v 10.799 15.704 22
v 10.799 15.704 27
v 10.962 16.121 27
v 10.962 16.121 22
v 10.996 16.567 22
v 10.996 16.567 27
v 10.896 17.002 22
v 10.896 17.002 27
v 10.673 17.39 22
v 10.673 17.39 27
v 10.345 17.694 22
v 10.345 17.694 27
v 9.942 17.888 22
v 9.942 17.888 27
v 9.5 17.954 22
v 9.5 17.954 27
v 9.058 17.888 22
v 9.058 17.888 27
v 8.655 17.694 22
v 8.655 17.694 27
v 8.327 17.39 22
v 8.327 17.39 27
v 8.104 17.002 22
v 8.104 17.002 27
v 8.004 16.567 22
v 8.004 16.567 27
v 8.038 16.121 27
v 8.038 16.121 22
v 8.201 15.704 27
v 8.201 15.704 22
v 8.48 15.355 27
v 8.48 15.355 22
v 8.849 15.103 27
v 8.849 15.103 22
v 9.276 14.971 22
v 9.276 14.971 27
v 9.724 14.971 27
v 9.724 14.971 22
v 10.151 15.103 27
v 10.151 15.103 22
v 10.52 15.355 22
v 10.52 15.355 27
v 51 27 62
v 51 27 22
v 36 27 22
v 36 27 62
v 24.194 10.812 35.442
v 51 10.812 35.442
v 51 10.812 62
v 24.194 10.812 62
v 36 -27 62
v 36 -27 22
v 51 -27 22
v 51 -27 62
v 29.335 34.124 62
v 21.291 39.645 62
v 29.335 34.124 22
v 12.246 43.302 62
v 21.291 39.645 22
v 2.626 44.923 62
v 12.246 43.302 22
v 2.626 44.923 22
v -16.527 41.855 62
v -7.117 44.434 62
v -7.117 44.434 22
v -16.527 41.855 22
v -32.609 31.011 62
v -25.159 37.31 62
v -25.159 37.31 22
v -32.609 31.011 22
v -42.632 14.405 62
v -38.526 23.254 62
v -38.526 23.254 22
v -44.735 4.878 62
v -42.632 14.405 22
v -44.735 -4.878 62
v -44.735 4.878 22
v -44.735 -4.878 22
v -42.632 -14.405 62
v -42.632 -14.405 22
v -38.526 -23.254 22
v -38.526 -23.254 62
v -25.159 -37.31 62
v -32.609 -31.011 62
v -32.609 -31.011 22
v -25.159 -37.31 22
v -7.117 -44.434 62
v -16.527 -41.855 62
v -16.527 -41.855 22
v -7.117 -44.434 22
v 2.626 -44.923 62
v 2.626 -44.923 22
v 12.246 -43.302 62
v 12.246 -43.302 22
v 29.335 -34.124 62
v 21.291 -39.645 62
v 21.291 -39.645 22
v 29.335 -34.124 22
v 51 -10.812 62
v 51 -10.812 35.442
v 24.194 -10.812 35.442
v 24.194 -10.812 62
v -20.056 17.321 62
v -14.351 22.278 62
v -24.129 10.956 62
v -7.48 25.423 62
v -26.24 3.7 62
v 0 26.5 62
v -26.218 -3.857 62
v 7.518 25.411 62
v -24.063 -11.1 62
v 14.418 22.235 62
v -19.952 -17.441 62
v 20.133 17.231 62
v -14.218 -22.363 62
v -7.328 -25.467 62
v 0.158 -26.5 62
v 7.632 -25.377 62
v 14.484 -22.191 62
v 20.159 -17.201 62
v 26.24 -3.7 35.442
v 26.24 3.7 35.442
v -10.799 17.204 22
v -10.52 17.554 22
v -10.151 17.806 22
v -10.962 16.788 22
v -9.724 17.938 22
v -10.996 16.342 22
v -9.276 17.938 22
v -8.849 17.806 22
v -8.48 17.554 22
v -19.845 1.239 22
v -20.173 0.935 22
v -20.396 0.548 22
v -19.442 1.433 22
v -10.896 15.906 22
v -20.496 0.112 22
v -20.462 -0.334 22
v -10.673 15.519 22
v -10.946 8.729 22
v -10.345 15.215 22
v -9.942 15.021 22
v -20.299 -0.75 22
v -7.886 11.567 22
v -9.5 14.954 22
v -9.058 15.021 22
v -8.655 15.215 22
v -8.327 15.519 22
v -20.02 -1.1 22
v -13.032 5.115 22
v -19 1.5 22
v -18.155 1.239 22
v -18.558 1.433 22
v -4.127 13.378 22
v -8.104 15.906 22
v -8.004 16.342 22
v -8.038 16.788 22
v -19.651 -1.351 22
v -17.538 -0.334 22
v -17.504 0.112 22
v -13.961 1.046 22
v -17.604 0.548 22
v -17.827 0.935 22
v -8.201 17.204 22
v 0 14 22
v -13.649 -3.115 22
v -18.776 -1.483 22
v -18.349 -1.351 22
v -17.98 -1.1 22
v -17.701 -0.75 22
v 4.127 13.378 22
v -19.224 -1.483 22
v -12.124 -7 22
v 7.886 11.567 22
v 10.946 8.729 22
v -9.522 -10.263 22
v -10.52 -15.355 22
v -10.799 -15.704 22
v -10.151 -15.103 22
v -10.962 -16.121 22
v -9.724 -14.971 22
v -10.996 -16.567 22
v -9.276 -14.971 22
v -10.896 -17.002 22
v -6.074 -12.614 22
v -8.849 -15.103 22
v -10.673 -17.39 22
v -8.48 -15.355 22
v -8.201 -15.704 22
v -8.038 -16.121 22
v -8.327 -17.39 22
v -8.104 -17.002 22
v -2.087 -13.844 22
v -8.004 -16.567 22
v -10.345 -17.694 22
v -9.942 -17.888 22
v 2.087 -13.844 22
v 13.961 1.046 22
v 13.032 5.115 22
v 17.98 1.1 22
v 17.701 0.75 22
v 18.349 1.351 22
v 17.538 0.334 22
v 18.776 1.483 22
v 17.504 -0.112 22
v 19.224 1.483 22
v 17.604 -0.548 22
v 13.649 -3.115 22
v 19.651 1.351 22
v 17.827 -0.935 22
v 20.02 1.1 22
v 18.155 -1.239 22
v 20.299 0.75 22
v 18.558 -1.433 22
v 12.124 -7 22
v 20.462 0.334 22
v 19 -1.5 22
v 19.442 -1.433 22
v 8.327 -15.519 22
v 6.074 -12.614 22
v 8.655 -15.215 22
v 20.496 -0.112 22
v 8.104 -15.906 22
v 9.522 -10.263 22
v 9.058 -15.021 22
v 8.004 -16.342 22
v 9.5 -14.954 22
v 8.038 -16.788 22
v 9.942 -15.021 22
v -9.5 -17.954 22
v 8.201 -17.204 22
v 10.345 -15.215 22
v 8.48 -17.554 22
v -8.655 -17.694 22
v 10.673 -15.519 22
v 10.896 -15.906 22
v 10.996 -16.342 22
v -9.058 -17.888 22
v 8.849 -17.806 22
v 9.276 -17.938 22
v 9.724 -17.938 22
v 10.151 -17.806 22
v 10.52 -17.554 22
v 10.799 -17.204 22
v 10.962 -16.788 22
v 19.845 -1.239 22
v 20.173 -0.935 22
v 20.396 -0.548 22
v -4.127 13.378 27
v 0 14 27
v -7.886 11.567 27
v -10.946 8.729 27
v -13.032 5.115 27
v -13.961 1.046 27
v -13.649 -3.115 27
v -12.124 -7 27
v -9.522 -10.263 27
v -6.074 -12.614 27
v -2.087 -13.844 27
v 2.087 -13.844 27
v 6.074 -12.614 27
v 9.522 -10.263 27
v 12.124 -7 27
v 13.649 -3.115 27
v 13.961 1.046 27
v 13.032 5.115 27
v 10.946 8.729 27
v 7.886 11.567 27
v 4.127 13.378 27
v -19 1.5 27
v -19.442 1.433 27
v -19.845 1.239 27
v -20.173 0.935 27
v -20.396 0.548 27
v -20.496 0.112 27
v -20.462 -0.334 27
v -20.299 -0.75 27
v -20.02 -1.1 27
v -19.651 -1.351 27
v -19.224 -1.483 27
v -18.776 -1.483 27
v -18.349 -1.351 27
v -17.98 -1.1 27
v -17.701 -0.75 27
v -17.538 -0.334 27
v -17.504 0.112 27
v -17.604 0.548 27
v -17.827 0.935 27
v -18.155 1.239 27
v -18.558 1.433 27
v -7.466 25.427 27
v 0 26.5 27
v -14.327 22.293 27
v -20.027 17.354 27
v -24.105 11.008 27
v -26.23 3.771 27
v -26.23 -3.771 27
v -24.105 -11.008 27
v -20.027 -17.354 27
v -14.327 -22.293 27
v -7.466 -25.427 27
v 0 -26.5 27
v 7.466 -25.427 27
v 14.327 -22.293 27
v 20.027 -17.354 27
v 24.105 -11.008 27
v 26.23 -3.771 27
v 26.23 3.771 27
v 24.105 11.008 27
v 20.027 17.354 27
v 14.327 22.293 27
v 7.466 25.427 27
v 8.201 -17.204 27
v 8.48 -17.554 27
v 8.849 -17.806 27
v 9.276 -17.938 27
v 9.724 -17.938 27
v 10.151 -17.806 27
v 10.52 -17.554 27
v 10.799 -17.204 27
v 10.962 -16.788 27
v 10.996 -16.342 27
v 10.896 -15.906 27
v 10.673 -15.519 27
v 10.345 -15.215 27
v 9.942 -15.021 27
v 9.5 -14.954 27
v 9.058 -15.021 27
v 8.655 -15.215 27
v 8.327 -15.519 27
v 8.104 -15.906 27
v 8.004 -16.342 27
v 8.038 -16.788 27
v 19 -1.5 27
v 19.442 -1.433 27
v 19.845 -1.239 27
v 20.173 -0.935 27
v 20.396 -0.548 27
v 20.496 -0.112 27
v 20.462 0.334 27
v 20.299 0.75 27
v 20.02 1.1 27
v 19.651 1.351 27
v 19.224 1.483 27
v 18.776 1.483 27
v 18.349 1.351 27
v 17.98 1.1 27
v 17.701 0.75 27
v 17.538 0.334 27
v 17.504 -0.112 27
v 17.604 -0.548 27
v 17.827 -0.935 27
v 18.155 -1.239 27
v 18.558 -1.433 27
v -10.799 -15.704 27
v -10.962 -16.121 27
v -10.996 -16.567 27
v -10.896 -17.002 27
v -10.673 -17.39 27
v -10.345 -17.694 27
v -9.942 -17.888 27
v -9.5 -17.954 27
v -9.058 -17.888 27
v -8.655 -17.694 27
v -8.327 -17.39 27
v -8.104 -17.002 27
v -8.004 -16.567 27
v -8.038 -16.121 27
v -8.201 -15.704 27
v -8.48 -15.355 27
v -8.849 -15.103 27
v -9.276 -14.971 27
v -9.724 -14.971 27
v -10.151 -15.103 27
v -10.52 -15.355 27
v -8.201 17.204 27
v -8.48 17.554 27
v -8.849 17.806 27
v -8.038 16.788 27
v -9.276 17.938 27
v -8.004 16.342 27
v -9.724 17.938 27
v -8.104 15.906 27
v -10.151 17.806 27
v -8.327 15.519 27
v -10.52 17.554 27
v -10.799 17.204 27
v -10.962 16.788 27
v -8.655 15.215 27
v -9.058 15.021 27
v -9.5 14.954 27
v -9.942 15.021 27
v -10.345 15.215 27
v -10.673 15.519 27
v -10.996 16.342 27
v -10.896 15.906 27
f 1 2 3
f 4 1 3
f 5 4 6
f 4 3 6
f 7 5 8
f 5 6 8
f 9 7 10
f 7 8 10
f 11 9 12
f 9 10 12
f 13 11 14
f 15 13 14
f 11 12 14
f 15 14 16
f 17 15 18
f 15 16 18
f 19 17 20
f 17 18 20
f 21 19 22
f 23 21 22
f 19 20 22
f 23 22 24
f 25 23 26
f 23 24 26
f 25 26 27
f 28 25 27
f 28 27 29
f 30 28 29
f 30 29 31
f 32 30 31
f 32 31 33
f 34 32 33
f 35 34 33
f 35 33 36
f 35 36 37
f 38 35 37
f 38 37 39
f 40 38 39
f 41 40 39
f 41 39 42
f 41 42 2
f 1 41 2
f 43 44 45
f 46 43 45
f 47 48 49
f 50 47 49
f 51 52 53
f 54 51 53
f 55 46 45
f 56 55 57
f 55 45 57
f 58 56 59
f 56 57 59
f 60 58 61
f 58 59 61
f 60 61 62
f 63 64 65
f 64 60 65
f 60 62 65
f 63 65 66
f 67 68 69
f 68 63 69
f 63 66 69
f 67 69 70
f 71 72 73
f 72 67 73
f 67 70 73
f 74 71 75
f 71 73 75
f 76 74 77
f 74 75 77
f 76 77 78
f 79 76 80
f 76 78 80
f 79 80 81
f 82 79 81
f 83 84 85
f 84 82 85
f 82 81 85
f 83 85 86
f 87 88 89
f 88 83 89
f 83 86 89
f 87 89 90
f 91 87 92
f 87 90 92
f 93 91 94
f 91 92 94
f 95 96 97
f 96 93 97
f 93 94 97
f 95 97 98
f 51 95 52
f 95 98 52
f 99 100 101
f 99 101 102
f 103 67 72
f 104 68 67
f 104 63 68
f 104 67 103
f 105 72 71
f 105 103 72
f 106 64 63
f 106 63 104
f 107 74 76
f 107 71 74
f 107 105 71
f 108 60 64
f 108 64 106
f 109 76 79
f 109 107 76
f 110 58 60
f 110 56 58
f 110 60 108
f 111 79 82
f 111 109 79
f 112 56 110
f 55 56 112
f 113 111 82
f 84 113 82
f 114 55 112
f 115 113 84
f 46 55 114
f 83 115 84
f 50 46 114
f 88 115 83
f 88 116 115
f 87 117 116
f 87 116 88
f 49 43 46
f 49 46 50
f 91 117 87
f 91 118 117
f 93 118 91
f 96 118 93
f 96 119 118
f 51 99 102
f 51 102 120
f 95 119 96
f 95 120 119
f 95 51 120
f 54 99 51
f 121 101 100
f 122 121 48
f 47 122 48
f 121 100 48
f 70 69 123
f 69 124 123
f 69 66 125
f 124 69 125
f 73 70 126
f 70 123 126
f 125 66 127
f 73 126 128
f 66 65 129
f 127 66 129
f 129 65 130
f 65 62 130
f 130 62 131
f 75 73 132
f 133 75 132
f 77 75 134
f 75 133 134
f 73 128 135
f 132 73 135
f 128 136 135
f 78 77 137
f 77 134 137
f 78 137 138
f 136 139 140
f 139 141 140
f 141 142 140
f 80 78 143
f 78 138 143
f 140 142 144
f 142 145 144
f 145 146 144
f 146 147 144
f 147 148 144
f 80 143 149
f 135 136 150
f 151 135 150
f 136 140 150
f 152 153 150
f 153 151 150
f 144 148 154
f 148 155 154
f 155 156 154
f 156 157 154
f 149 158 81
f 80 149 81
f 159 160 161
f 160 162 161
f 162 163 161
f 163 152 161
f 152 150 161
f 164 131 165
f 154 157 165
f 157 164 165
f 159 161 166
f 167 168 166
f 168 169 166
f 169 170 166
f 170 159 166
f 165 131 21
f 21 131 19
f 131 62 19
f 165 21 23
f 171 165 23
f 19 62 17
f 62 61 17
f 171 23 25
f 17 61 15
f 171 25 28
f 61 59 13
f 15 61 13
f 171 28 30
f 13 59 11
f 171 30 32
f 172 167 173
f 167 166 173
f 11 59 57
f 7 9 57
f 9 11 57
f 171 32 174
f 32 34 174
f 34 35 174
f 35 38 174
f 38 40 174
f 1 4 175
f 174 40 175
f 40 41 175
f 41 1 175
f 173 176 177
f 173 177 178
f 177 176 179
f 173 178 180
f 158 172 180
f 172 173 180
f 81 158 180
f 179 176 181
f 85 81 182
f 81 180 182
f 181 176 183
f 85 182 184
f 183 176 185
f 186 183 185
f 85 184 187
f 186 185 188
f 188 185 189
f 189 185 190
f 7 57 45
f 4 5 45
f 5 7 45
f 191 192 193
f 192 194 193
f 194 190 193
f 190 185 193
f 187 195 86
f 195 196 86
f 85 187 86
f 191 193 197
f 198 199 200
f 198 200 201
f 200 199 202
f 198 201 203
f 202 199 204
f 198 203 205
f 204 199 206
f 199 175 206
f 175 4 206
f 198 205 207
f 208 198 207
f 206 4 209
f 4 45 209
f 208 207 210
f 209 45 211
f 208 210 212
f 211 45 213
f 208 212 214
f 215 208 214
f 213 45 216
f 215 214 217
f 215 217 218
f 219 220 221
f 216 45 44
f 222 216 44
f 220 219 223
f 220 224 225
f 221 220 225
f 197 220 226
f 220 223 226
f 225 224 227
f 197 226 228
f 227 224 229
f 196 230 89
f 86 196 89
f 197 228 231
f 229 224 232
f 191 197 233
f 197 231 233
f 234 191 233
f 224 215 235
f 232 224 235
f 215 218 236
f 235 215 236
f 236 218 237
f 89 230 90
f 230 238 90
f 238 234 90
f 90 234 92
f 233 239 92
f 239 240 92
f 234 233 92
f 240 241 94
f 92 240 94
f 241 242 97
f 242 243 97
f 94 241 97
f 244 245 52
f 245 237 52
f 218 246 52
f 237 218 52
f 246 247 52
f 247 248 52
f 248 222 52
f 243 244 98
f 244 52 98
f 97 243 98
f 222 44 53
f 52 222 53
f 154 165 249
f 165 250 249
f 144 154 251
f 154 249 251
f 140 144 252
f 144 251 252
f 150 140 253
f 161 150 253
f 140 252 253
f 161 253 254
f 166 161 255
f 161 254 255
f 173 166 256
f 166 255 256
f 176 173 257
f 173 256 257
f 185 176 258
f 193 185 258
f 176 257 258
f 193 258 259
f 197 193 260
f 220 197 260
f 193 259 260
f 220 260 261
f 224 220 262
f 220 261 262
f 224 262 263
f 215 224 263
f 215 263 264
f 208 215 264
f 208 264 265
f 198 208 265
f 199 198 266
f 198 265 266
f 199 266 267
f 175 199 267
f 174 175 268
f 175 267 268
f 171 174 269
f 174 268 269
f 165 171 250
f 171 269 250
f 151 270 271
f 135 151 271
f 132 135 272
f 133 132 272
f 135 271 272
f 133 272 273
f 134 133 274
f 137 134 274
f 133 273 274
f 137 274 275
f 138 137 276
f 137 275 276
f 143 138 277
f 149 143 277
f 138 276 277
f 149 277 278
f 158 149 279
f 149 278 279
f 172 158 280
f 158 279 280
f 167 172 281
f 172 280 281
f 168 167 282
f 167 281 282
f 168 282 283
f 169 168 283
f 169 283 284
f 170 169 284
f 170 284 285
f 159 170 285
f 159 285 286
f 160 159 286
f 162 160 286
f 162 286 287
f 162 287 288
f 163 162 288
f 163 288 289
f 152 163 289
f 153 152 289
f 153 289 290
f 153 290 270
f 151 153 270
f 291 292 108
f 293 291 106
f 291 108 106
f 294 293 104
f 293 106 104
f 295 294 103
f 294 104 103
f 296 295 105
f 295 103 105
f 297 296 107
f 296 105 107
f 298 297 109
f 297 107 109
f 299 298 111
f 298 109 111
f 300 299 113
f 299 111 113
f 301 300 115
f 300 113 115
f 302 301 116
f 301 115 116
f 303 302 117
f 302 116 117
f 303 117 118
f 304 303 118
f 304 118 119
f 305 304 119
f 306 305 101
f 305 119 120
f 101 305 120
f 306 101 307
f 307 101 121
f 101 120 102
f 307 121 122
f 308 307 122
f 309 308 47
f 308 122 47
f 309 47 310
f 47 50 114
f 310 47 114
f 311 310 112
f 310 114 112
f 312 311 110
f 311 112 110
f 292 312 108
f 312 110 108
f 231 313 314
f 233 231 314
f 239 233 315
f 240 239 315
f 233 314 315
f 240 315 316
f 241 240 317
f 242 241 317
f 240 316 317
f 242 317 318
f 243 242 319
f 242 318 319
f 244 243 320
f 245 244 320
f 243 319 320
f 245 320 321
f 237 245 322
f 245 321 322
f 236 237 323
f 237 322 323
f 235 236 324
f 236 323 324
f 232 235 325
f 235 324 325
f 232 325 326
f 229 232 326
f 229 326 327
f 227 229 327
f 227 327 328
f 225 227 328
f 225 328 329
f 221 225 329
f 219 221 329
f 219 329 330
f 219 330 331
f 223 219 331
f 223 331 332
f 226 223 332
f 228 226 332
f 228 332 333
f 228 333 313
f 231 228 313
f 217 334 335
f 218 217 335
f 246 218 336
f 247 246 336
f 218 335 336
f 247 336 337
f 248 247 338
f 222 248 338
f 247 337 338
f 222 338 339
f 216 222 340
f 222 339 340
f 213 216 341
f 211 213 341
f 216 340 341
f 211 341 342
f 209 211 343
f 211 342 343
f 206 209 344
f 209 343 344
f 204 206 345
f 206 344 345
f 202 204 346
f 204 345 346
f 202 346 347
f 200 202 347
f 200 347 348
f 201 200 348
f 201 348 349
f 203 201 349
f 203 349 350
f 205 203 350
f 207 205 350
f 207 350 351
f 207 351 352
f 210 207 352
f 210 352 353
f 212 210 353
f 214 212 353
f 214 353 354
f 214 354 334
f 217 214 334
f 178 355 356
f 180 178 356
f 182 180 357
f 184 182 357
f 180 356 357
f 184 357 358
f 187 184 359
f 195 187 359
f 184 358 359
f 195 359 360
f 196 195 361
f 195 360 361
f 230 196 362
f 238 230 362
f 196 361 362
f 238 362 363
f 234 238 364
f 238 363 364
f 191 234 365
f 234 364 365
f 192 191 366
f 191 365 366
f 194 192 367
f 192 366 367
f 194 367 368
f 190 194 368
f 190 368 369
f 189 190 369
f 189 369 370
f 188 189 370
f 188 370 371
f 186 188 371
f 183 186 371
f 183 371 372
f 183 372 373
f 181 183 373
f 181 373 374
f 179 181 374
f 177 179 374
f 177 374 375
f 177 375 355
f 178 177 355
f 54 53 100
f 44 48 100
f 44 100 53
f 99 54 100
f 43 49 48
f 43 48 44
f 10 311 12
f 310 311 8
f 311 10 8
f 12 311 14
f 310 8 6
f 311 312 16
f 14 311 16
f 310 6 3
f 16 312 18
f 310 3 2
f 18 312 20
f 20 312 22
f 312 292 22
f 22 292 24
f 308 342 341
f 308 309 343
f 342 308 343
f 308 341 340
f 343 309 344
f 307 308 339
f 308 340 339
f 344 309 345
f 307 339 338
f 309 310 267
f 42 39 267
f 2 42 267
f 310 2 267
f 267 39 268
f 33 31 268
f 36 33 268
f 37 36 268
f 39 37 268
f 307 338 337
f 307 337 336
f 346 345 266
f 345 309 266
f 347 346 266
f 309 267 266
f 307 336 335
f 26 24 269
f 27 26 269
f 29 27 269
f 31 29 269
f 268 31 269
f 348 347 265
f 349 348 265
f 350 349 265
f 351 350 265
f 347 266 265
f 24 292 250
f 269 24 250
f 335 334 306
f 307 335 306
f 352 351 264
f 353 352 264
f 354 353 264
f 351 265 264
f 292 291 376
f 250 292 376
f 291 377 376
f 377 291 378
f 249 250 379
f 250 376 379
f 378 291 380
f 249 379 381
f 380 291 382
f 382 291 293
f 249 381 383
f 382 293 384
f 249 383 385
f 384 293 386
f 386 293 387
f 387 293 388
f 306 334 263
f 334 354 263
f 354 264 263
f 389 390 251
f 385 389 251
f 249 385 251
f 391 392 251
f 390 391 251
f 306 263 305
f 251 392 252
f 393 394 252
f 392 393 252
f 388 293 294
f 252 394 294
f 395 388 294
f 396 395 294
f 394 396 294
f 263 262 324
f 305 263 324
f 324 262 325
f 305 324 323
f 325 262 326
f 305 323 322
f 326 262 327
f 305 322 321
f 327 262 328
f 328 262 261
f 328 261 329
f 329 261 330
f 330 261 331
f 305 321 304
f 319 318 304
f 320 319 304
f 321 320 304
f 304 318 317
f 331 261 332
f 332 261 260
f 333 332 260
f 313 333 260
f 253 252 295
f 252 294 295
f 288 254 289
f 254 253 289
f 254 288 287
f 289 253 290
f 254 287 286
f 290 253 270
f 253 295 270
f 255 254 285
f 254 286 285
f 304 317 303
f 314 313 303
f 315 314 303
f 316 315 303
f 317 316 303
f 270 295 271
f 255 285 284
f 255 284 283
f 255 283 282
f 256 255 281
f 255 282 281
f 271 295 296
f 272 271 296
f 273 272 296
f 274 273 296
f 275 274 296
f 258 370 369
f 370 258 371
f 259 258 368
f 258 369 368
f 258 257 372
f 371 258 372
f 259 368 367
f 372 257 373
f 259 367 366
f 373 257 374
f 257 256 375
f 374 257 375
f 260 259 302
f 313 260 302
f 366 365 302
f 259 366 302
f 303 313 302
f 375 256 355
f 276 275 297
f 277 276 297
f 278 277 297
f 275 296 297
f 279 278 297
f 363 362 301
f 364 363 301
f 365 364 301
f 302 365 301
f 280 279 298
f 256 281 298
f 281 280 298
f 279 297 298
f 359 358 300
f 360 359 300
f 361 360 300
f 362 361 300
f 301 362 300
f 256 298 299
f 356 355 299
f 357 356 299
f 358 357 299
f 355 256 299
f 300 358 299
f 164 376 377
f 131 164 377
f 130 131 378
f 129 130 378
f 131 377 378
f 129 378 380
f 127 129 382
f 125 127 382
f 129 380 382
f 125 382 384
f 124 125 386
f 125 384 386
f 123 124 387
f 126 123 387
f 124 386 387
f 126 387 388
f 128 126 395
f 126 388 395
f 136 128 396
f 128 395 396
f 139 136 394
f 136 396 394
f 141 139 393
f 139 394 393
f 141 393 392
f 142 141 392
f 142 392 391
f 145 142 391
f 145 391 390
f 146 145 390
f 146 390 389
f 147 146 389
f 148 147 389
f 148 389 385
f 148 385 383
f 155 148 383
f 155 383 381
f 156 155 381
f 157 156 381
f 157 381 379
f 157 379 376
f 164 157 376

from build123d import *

# Parameters (mm, degrees)
SKETCH014_R             = 1.5
POCKET_DEPTH            = 271.834281
POLARPATTERN_COUNT      = 6
PAD_DEPTH               = 40
SKETCH016_W             = 21.623292
SKETCH016_H             = 27.433631
POCKET001_DEPTH         = 35
BODY003_PLACEMENT_ANGLE = 90


with BuildPart() as part:
    # Sketch → Revolution (revolve)
    with BuildSketch(Plane.XZ):
        Polygon((14, 0), (14, 5), (26.5, 5), (26.5, 40), (45, 40), (45, 0), align=None)
    revolve(axis=Axis((0, 0, 0), (0, 0, 1)))

    # Sketch014 → Pocket (cut, through all)
    with BuildSketch(Plane.XY.offset(5)):
        with Locations((0, 19)):
            Circle(SKETCH014_R)
    pocket = extrude(amount=-POCKET_DEPTH, mode=Mode.SUBTRACT)

    # PolarPattern: Pocket ×6 about axis
    polarpattern_axis = Axis((0, 0, 5), (0, 0, 1))
    for i in range(1, POLARPATTERN_COUNT):
        add(pocket.rotate(polarpattern_axis, i * 360 / POLARPATTERN_COUNT), mode=Mode.SUBTRACT)

    # Sketch015 (on Face12 of PolarPattern) → Pad (join)
    with BuildSketch(Plane(origin=(0, 0, 40), x_dir=(-1, 0, 0), z_dir=(0, 0, 1))):
        with BuildLine():
            Line((-27, 51), (-27, 36))
            ThreePointArc((-21.35998, 39.607465), (-24.247172, 37.908767), (-27, 36))
            Line((-21.35998, 39.607465), (21.35998, 39.607465))
            ThreePointArc((27, 36), (24.247172, 37.908767), (21.35998, 39.607465))
            Line((27, 36), (27, 51))
            Line((27, 51), (-27, 51))
        make_face()
    extrude(amount=-PAD_DEPTH)

    # Sketch016 (on Face2 of Pad) → Pocket001 (cut)
    with BuildSketch(Plane.XZ.offset(51)):
        with Locations((0, 27.158627)):
            Rectangle(SKETCH016_W, SKETCH016_H)
    extrude(amount=-POCKET001_DEPTH, mode=Mode.SUBTRACT)


with BuildPart() as part_1:
    # Body003 placement: moved
    add(part.part.moved(Location((0, 0, 22))).rotate(Axis((0, 0, 22), (0, 0, 1)), BODY003_PLACEMENT_ANGLE))


solid = part_1.part
